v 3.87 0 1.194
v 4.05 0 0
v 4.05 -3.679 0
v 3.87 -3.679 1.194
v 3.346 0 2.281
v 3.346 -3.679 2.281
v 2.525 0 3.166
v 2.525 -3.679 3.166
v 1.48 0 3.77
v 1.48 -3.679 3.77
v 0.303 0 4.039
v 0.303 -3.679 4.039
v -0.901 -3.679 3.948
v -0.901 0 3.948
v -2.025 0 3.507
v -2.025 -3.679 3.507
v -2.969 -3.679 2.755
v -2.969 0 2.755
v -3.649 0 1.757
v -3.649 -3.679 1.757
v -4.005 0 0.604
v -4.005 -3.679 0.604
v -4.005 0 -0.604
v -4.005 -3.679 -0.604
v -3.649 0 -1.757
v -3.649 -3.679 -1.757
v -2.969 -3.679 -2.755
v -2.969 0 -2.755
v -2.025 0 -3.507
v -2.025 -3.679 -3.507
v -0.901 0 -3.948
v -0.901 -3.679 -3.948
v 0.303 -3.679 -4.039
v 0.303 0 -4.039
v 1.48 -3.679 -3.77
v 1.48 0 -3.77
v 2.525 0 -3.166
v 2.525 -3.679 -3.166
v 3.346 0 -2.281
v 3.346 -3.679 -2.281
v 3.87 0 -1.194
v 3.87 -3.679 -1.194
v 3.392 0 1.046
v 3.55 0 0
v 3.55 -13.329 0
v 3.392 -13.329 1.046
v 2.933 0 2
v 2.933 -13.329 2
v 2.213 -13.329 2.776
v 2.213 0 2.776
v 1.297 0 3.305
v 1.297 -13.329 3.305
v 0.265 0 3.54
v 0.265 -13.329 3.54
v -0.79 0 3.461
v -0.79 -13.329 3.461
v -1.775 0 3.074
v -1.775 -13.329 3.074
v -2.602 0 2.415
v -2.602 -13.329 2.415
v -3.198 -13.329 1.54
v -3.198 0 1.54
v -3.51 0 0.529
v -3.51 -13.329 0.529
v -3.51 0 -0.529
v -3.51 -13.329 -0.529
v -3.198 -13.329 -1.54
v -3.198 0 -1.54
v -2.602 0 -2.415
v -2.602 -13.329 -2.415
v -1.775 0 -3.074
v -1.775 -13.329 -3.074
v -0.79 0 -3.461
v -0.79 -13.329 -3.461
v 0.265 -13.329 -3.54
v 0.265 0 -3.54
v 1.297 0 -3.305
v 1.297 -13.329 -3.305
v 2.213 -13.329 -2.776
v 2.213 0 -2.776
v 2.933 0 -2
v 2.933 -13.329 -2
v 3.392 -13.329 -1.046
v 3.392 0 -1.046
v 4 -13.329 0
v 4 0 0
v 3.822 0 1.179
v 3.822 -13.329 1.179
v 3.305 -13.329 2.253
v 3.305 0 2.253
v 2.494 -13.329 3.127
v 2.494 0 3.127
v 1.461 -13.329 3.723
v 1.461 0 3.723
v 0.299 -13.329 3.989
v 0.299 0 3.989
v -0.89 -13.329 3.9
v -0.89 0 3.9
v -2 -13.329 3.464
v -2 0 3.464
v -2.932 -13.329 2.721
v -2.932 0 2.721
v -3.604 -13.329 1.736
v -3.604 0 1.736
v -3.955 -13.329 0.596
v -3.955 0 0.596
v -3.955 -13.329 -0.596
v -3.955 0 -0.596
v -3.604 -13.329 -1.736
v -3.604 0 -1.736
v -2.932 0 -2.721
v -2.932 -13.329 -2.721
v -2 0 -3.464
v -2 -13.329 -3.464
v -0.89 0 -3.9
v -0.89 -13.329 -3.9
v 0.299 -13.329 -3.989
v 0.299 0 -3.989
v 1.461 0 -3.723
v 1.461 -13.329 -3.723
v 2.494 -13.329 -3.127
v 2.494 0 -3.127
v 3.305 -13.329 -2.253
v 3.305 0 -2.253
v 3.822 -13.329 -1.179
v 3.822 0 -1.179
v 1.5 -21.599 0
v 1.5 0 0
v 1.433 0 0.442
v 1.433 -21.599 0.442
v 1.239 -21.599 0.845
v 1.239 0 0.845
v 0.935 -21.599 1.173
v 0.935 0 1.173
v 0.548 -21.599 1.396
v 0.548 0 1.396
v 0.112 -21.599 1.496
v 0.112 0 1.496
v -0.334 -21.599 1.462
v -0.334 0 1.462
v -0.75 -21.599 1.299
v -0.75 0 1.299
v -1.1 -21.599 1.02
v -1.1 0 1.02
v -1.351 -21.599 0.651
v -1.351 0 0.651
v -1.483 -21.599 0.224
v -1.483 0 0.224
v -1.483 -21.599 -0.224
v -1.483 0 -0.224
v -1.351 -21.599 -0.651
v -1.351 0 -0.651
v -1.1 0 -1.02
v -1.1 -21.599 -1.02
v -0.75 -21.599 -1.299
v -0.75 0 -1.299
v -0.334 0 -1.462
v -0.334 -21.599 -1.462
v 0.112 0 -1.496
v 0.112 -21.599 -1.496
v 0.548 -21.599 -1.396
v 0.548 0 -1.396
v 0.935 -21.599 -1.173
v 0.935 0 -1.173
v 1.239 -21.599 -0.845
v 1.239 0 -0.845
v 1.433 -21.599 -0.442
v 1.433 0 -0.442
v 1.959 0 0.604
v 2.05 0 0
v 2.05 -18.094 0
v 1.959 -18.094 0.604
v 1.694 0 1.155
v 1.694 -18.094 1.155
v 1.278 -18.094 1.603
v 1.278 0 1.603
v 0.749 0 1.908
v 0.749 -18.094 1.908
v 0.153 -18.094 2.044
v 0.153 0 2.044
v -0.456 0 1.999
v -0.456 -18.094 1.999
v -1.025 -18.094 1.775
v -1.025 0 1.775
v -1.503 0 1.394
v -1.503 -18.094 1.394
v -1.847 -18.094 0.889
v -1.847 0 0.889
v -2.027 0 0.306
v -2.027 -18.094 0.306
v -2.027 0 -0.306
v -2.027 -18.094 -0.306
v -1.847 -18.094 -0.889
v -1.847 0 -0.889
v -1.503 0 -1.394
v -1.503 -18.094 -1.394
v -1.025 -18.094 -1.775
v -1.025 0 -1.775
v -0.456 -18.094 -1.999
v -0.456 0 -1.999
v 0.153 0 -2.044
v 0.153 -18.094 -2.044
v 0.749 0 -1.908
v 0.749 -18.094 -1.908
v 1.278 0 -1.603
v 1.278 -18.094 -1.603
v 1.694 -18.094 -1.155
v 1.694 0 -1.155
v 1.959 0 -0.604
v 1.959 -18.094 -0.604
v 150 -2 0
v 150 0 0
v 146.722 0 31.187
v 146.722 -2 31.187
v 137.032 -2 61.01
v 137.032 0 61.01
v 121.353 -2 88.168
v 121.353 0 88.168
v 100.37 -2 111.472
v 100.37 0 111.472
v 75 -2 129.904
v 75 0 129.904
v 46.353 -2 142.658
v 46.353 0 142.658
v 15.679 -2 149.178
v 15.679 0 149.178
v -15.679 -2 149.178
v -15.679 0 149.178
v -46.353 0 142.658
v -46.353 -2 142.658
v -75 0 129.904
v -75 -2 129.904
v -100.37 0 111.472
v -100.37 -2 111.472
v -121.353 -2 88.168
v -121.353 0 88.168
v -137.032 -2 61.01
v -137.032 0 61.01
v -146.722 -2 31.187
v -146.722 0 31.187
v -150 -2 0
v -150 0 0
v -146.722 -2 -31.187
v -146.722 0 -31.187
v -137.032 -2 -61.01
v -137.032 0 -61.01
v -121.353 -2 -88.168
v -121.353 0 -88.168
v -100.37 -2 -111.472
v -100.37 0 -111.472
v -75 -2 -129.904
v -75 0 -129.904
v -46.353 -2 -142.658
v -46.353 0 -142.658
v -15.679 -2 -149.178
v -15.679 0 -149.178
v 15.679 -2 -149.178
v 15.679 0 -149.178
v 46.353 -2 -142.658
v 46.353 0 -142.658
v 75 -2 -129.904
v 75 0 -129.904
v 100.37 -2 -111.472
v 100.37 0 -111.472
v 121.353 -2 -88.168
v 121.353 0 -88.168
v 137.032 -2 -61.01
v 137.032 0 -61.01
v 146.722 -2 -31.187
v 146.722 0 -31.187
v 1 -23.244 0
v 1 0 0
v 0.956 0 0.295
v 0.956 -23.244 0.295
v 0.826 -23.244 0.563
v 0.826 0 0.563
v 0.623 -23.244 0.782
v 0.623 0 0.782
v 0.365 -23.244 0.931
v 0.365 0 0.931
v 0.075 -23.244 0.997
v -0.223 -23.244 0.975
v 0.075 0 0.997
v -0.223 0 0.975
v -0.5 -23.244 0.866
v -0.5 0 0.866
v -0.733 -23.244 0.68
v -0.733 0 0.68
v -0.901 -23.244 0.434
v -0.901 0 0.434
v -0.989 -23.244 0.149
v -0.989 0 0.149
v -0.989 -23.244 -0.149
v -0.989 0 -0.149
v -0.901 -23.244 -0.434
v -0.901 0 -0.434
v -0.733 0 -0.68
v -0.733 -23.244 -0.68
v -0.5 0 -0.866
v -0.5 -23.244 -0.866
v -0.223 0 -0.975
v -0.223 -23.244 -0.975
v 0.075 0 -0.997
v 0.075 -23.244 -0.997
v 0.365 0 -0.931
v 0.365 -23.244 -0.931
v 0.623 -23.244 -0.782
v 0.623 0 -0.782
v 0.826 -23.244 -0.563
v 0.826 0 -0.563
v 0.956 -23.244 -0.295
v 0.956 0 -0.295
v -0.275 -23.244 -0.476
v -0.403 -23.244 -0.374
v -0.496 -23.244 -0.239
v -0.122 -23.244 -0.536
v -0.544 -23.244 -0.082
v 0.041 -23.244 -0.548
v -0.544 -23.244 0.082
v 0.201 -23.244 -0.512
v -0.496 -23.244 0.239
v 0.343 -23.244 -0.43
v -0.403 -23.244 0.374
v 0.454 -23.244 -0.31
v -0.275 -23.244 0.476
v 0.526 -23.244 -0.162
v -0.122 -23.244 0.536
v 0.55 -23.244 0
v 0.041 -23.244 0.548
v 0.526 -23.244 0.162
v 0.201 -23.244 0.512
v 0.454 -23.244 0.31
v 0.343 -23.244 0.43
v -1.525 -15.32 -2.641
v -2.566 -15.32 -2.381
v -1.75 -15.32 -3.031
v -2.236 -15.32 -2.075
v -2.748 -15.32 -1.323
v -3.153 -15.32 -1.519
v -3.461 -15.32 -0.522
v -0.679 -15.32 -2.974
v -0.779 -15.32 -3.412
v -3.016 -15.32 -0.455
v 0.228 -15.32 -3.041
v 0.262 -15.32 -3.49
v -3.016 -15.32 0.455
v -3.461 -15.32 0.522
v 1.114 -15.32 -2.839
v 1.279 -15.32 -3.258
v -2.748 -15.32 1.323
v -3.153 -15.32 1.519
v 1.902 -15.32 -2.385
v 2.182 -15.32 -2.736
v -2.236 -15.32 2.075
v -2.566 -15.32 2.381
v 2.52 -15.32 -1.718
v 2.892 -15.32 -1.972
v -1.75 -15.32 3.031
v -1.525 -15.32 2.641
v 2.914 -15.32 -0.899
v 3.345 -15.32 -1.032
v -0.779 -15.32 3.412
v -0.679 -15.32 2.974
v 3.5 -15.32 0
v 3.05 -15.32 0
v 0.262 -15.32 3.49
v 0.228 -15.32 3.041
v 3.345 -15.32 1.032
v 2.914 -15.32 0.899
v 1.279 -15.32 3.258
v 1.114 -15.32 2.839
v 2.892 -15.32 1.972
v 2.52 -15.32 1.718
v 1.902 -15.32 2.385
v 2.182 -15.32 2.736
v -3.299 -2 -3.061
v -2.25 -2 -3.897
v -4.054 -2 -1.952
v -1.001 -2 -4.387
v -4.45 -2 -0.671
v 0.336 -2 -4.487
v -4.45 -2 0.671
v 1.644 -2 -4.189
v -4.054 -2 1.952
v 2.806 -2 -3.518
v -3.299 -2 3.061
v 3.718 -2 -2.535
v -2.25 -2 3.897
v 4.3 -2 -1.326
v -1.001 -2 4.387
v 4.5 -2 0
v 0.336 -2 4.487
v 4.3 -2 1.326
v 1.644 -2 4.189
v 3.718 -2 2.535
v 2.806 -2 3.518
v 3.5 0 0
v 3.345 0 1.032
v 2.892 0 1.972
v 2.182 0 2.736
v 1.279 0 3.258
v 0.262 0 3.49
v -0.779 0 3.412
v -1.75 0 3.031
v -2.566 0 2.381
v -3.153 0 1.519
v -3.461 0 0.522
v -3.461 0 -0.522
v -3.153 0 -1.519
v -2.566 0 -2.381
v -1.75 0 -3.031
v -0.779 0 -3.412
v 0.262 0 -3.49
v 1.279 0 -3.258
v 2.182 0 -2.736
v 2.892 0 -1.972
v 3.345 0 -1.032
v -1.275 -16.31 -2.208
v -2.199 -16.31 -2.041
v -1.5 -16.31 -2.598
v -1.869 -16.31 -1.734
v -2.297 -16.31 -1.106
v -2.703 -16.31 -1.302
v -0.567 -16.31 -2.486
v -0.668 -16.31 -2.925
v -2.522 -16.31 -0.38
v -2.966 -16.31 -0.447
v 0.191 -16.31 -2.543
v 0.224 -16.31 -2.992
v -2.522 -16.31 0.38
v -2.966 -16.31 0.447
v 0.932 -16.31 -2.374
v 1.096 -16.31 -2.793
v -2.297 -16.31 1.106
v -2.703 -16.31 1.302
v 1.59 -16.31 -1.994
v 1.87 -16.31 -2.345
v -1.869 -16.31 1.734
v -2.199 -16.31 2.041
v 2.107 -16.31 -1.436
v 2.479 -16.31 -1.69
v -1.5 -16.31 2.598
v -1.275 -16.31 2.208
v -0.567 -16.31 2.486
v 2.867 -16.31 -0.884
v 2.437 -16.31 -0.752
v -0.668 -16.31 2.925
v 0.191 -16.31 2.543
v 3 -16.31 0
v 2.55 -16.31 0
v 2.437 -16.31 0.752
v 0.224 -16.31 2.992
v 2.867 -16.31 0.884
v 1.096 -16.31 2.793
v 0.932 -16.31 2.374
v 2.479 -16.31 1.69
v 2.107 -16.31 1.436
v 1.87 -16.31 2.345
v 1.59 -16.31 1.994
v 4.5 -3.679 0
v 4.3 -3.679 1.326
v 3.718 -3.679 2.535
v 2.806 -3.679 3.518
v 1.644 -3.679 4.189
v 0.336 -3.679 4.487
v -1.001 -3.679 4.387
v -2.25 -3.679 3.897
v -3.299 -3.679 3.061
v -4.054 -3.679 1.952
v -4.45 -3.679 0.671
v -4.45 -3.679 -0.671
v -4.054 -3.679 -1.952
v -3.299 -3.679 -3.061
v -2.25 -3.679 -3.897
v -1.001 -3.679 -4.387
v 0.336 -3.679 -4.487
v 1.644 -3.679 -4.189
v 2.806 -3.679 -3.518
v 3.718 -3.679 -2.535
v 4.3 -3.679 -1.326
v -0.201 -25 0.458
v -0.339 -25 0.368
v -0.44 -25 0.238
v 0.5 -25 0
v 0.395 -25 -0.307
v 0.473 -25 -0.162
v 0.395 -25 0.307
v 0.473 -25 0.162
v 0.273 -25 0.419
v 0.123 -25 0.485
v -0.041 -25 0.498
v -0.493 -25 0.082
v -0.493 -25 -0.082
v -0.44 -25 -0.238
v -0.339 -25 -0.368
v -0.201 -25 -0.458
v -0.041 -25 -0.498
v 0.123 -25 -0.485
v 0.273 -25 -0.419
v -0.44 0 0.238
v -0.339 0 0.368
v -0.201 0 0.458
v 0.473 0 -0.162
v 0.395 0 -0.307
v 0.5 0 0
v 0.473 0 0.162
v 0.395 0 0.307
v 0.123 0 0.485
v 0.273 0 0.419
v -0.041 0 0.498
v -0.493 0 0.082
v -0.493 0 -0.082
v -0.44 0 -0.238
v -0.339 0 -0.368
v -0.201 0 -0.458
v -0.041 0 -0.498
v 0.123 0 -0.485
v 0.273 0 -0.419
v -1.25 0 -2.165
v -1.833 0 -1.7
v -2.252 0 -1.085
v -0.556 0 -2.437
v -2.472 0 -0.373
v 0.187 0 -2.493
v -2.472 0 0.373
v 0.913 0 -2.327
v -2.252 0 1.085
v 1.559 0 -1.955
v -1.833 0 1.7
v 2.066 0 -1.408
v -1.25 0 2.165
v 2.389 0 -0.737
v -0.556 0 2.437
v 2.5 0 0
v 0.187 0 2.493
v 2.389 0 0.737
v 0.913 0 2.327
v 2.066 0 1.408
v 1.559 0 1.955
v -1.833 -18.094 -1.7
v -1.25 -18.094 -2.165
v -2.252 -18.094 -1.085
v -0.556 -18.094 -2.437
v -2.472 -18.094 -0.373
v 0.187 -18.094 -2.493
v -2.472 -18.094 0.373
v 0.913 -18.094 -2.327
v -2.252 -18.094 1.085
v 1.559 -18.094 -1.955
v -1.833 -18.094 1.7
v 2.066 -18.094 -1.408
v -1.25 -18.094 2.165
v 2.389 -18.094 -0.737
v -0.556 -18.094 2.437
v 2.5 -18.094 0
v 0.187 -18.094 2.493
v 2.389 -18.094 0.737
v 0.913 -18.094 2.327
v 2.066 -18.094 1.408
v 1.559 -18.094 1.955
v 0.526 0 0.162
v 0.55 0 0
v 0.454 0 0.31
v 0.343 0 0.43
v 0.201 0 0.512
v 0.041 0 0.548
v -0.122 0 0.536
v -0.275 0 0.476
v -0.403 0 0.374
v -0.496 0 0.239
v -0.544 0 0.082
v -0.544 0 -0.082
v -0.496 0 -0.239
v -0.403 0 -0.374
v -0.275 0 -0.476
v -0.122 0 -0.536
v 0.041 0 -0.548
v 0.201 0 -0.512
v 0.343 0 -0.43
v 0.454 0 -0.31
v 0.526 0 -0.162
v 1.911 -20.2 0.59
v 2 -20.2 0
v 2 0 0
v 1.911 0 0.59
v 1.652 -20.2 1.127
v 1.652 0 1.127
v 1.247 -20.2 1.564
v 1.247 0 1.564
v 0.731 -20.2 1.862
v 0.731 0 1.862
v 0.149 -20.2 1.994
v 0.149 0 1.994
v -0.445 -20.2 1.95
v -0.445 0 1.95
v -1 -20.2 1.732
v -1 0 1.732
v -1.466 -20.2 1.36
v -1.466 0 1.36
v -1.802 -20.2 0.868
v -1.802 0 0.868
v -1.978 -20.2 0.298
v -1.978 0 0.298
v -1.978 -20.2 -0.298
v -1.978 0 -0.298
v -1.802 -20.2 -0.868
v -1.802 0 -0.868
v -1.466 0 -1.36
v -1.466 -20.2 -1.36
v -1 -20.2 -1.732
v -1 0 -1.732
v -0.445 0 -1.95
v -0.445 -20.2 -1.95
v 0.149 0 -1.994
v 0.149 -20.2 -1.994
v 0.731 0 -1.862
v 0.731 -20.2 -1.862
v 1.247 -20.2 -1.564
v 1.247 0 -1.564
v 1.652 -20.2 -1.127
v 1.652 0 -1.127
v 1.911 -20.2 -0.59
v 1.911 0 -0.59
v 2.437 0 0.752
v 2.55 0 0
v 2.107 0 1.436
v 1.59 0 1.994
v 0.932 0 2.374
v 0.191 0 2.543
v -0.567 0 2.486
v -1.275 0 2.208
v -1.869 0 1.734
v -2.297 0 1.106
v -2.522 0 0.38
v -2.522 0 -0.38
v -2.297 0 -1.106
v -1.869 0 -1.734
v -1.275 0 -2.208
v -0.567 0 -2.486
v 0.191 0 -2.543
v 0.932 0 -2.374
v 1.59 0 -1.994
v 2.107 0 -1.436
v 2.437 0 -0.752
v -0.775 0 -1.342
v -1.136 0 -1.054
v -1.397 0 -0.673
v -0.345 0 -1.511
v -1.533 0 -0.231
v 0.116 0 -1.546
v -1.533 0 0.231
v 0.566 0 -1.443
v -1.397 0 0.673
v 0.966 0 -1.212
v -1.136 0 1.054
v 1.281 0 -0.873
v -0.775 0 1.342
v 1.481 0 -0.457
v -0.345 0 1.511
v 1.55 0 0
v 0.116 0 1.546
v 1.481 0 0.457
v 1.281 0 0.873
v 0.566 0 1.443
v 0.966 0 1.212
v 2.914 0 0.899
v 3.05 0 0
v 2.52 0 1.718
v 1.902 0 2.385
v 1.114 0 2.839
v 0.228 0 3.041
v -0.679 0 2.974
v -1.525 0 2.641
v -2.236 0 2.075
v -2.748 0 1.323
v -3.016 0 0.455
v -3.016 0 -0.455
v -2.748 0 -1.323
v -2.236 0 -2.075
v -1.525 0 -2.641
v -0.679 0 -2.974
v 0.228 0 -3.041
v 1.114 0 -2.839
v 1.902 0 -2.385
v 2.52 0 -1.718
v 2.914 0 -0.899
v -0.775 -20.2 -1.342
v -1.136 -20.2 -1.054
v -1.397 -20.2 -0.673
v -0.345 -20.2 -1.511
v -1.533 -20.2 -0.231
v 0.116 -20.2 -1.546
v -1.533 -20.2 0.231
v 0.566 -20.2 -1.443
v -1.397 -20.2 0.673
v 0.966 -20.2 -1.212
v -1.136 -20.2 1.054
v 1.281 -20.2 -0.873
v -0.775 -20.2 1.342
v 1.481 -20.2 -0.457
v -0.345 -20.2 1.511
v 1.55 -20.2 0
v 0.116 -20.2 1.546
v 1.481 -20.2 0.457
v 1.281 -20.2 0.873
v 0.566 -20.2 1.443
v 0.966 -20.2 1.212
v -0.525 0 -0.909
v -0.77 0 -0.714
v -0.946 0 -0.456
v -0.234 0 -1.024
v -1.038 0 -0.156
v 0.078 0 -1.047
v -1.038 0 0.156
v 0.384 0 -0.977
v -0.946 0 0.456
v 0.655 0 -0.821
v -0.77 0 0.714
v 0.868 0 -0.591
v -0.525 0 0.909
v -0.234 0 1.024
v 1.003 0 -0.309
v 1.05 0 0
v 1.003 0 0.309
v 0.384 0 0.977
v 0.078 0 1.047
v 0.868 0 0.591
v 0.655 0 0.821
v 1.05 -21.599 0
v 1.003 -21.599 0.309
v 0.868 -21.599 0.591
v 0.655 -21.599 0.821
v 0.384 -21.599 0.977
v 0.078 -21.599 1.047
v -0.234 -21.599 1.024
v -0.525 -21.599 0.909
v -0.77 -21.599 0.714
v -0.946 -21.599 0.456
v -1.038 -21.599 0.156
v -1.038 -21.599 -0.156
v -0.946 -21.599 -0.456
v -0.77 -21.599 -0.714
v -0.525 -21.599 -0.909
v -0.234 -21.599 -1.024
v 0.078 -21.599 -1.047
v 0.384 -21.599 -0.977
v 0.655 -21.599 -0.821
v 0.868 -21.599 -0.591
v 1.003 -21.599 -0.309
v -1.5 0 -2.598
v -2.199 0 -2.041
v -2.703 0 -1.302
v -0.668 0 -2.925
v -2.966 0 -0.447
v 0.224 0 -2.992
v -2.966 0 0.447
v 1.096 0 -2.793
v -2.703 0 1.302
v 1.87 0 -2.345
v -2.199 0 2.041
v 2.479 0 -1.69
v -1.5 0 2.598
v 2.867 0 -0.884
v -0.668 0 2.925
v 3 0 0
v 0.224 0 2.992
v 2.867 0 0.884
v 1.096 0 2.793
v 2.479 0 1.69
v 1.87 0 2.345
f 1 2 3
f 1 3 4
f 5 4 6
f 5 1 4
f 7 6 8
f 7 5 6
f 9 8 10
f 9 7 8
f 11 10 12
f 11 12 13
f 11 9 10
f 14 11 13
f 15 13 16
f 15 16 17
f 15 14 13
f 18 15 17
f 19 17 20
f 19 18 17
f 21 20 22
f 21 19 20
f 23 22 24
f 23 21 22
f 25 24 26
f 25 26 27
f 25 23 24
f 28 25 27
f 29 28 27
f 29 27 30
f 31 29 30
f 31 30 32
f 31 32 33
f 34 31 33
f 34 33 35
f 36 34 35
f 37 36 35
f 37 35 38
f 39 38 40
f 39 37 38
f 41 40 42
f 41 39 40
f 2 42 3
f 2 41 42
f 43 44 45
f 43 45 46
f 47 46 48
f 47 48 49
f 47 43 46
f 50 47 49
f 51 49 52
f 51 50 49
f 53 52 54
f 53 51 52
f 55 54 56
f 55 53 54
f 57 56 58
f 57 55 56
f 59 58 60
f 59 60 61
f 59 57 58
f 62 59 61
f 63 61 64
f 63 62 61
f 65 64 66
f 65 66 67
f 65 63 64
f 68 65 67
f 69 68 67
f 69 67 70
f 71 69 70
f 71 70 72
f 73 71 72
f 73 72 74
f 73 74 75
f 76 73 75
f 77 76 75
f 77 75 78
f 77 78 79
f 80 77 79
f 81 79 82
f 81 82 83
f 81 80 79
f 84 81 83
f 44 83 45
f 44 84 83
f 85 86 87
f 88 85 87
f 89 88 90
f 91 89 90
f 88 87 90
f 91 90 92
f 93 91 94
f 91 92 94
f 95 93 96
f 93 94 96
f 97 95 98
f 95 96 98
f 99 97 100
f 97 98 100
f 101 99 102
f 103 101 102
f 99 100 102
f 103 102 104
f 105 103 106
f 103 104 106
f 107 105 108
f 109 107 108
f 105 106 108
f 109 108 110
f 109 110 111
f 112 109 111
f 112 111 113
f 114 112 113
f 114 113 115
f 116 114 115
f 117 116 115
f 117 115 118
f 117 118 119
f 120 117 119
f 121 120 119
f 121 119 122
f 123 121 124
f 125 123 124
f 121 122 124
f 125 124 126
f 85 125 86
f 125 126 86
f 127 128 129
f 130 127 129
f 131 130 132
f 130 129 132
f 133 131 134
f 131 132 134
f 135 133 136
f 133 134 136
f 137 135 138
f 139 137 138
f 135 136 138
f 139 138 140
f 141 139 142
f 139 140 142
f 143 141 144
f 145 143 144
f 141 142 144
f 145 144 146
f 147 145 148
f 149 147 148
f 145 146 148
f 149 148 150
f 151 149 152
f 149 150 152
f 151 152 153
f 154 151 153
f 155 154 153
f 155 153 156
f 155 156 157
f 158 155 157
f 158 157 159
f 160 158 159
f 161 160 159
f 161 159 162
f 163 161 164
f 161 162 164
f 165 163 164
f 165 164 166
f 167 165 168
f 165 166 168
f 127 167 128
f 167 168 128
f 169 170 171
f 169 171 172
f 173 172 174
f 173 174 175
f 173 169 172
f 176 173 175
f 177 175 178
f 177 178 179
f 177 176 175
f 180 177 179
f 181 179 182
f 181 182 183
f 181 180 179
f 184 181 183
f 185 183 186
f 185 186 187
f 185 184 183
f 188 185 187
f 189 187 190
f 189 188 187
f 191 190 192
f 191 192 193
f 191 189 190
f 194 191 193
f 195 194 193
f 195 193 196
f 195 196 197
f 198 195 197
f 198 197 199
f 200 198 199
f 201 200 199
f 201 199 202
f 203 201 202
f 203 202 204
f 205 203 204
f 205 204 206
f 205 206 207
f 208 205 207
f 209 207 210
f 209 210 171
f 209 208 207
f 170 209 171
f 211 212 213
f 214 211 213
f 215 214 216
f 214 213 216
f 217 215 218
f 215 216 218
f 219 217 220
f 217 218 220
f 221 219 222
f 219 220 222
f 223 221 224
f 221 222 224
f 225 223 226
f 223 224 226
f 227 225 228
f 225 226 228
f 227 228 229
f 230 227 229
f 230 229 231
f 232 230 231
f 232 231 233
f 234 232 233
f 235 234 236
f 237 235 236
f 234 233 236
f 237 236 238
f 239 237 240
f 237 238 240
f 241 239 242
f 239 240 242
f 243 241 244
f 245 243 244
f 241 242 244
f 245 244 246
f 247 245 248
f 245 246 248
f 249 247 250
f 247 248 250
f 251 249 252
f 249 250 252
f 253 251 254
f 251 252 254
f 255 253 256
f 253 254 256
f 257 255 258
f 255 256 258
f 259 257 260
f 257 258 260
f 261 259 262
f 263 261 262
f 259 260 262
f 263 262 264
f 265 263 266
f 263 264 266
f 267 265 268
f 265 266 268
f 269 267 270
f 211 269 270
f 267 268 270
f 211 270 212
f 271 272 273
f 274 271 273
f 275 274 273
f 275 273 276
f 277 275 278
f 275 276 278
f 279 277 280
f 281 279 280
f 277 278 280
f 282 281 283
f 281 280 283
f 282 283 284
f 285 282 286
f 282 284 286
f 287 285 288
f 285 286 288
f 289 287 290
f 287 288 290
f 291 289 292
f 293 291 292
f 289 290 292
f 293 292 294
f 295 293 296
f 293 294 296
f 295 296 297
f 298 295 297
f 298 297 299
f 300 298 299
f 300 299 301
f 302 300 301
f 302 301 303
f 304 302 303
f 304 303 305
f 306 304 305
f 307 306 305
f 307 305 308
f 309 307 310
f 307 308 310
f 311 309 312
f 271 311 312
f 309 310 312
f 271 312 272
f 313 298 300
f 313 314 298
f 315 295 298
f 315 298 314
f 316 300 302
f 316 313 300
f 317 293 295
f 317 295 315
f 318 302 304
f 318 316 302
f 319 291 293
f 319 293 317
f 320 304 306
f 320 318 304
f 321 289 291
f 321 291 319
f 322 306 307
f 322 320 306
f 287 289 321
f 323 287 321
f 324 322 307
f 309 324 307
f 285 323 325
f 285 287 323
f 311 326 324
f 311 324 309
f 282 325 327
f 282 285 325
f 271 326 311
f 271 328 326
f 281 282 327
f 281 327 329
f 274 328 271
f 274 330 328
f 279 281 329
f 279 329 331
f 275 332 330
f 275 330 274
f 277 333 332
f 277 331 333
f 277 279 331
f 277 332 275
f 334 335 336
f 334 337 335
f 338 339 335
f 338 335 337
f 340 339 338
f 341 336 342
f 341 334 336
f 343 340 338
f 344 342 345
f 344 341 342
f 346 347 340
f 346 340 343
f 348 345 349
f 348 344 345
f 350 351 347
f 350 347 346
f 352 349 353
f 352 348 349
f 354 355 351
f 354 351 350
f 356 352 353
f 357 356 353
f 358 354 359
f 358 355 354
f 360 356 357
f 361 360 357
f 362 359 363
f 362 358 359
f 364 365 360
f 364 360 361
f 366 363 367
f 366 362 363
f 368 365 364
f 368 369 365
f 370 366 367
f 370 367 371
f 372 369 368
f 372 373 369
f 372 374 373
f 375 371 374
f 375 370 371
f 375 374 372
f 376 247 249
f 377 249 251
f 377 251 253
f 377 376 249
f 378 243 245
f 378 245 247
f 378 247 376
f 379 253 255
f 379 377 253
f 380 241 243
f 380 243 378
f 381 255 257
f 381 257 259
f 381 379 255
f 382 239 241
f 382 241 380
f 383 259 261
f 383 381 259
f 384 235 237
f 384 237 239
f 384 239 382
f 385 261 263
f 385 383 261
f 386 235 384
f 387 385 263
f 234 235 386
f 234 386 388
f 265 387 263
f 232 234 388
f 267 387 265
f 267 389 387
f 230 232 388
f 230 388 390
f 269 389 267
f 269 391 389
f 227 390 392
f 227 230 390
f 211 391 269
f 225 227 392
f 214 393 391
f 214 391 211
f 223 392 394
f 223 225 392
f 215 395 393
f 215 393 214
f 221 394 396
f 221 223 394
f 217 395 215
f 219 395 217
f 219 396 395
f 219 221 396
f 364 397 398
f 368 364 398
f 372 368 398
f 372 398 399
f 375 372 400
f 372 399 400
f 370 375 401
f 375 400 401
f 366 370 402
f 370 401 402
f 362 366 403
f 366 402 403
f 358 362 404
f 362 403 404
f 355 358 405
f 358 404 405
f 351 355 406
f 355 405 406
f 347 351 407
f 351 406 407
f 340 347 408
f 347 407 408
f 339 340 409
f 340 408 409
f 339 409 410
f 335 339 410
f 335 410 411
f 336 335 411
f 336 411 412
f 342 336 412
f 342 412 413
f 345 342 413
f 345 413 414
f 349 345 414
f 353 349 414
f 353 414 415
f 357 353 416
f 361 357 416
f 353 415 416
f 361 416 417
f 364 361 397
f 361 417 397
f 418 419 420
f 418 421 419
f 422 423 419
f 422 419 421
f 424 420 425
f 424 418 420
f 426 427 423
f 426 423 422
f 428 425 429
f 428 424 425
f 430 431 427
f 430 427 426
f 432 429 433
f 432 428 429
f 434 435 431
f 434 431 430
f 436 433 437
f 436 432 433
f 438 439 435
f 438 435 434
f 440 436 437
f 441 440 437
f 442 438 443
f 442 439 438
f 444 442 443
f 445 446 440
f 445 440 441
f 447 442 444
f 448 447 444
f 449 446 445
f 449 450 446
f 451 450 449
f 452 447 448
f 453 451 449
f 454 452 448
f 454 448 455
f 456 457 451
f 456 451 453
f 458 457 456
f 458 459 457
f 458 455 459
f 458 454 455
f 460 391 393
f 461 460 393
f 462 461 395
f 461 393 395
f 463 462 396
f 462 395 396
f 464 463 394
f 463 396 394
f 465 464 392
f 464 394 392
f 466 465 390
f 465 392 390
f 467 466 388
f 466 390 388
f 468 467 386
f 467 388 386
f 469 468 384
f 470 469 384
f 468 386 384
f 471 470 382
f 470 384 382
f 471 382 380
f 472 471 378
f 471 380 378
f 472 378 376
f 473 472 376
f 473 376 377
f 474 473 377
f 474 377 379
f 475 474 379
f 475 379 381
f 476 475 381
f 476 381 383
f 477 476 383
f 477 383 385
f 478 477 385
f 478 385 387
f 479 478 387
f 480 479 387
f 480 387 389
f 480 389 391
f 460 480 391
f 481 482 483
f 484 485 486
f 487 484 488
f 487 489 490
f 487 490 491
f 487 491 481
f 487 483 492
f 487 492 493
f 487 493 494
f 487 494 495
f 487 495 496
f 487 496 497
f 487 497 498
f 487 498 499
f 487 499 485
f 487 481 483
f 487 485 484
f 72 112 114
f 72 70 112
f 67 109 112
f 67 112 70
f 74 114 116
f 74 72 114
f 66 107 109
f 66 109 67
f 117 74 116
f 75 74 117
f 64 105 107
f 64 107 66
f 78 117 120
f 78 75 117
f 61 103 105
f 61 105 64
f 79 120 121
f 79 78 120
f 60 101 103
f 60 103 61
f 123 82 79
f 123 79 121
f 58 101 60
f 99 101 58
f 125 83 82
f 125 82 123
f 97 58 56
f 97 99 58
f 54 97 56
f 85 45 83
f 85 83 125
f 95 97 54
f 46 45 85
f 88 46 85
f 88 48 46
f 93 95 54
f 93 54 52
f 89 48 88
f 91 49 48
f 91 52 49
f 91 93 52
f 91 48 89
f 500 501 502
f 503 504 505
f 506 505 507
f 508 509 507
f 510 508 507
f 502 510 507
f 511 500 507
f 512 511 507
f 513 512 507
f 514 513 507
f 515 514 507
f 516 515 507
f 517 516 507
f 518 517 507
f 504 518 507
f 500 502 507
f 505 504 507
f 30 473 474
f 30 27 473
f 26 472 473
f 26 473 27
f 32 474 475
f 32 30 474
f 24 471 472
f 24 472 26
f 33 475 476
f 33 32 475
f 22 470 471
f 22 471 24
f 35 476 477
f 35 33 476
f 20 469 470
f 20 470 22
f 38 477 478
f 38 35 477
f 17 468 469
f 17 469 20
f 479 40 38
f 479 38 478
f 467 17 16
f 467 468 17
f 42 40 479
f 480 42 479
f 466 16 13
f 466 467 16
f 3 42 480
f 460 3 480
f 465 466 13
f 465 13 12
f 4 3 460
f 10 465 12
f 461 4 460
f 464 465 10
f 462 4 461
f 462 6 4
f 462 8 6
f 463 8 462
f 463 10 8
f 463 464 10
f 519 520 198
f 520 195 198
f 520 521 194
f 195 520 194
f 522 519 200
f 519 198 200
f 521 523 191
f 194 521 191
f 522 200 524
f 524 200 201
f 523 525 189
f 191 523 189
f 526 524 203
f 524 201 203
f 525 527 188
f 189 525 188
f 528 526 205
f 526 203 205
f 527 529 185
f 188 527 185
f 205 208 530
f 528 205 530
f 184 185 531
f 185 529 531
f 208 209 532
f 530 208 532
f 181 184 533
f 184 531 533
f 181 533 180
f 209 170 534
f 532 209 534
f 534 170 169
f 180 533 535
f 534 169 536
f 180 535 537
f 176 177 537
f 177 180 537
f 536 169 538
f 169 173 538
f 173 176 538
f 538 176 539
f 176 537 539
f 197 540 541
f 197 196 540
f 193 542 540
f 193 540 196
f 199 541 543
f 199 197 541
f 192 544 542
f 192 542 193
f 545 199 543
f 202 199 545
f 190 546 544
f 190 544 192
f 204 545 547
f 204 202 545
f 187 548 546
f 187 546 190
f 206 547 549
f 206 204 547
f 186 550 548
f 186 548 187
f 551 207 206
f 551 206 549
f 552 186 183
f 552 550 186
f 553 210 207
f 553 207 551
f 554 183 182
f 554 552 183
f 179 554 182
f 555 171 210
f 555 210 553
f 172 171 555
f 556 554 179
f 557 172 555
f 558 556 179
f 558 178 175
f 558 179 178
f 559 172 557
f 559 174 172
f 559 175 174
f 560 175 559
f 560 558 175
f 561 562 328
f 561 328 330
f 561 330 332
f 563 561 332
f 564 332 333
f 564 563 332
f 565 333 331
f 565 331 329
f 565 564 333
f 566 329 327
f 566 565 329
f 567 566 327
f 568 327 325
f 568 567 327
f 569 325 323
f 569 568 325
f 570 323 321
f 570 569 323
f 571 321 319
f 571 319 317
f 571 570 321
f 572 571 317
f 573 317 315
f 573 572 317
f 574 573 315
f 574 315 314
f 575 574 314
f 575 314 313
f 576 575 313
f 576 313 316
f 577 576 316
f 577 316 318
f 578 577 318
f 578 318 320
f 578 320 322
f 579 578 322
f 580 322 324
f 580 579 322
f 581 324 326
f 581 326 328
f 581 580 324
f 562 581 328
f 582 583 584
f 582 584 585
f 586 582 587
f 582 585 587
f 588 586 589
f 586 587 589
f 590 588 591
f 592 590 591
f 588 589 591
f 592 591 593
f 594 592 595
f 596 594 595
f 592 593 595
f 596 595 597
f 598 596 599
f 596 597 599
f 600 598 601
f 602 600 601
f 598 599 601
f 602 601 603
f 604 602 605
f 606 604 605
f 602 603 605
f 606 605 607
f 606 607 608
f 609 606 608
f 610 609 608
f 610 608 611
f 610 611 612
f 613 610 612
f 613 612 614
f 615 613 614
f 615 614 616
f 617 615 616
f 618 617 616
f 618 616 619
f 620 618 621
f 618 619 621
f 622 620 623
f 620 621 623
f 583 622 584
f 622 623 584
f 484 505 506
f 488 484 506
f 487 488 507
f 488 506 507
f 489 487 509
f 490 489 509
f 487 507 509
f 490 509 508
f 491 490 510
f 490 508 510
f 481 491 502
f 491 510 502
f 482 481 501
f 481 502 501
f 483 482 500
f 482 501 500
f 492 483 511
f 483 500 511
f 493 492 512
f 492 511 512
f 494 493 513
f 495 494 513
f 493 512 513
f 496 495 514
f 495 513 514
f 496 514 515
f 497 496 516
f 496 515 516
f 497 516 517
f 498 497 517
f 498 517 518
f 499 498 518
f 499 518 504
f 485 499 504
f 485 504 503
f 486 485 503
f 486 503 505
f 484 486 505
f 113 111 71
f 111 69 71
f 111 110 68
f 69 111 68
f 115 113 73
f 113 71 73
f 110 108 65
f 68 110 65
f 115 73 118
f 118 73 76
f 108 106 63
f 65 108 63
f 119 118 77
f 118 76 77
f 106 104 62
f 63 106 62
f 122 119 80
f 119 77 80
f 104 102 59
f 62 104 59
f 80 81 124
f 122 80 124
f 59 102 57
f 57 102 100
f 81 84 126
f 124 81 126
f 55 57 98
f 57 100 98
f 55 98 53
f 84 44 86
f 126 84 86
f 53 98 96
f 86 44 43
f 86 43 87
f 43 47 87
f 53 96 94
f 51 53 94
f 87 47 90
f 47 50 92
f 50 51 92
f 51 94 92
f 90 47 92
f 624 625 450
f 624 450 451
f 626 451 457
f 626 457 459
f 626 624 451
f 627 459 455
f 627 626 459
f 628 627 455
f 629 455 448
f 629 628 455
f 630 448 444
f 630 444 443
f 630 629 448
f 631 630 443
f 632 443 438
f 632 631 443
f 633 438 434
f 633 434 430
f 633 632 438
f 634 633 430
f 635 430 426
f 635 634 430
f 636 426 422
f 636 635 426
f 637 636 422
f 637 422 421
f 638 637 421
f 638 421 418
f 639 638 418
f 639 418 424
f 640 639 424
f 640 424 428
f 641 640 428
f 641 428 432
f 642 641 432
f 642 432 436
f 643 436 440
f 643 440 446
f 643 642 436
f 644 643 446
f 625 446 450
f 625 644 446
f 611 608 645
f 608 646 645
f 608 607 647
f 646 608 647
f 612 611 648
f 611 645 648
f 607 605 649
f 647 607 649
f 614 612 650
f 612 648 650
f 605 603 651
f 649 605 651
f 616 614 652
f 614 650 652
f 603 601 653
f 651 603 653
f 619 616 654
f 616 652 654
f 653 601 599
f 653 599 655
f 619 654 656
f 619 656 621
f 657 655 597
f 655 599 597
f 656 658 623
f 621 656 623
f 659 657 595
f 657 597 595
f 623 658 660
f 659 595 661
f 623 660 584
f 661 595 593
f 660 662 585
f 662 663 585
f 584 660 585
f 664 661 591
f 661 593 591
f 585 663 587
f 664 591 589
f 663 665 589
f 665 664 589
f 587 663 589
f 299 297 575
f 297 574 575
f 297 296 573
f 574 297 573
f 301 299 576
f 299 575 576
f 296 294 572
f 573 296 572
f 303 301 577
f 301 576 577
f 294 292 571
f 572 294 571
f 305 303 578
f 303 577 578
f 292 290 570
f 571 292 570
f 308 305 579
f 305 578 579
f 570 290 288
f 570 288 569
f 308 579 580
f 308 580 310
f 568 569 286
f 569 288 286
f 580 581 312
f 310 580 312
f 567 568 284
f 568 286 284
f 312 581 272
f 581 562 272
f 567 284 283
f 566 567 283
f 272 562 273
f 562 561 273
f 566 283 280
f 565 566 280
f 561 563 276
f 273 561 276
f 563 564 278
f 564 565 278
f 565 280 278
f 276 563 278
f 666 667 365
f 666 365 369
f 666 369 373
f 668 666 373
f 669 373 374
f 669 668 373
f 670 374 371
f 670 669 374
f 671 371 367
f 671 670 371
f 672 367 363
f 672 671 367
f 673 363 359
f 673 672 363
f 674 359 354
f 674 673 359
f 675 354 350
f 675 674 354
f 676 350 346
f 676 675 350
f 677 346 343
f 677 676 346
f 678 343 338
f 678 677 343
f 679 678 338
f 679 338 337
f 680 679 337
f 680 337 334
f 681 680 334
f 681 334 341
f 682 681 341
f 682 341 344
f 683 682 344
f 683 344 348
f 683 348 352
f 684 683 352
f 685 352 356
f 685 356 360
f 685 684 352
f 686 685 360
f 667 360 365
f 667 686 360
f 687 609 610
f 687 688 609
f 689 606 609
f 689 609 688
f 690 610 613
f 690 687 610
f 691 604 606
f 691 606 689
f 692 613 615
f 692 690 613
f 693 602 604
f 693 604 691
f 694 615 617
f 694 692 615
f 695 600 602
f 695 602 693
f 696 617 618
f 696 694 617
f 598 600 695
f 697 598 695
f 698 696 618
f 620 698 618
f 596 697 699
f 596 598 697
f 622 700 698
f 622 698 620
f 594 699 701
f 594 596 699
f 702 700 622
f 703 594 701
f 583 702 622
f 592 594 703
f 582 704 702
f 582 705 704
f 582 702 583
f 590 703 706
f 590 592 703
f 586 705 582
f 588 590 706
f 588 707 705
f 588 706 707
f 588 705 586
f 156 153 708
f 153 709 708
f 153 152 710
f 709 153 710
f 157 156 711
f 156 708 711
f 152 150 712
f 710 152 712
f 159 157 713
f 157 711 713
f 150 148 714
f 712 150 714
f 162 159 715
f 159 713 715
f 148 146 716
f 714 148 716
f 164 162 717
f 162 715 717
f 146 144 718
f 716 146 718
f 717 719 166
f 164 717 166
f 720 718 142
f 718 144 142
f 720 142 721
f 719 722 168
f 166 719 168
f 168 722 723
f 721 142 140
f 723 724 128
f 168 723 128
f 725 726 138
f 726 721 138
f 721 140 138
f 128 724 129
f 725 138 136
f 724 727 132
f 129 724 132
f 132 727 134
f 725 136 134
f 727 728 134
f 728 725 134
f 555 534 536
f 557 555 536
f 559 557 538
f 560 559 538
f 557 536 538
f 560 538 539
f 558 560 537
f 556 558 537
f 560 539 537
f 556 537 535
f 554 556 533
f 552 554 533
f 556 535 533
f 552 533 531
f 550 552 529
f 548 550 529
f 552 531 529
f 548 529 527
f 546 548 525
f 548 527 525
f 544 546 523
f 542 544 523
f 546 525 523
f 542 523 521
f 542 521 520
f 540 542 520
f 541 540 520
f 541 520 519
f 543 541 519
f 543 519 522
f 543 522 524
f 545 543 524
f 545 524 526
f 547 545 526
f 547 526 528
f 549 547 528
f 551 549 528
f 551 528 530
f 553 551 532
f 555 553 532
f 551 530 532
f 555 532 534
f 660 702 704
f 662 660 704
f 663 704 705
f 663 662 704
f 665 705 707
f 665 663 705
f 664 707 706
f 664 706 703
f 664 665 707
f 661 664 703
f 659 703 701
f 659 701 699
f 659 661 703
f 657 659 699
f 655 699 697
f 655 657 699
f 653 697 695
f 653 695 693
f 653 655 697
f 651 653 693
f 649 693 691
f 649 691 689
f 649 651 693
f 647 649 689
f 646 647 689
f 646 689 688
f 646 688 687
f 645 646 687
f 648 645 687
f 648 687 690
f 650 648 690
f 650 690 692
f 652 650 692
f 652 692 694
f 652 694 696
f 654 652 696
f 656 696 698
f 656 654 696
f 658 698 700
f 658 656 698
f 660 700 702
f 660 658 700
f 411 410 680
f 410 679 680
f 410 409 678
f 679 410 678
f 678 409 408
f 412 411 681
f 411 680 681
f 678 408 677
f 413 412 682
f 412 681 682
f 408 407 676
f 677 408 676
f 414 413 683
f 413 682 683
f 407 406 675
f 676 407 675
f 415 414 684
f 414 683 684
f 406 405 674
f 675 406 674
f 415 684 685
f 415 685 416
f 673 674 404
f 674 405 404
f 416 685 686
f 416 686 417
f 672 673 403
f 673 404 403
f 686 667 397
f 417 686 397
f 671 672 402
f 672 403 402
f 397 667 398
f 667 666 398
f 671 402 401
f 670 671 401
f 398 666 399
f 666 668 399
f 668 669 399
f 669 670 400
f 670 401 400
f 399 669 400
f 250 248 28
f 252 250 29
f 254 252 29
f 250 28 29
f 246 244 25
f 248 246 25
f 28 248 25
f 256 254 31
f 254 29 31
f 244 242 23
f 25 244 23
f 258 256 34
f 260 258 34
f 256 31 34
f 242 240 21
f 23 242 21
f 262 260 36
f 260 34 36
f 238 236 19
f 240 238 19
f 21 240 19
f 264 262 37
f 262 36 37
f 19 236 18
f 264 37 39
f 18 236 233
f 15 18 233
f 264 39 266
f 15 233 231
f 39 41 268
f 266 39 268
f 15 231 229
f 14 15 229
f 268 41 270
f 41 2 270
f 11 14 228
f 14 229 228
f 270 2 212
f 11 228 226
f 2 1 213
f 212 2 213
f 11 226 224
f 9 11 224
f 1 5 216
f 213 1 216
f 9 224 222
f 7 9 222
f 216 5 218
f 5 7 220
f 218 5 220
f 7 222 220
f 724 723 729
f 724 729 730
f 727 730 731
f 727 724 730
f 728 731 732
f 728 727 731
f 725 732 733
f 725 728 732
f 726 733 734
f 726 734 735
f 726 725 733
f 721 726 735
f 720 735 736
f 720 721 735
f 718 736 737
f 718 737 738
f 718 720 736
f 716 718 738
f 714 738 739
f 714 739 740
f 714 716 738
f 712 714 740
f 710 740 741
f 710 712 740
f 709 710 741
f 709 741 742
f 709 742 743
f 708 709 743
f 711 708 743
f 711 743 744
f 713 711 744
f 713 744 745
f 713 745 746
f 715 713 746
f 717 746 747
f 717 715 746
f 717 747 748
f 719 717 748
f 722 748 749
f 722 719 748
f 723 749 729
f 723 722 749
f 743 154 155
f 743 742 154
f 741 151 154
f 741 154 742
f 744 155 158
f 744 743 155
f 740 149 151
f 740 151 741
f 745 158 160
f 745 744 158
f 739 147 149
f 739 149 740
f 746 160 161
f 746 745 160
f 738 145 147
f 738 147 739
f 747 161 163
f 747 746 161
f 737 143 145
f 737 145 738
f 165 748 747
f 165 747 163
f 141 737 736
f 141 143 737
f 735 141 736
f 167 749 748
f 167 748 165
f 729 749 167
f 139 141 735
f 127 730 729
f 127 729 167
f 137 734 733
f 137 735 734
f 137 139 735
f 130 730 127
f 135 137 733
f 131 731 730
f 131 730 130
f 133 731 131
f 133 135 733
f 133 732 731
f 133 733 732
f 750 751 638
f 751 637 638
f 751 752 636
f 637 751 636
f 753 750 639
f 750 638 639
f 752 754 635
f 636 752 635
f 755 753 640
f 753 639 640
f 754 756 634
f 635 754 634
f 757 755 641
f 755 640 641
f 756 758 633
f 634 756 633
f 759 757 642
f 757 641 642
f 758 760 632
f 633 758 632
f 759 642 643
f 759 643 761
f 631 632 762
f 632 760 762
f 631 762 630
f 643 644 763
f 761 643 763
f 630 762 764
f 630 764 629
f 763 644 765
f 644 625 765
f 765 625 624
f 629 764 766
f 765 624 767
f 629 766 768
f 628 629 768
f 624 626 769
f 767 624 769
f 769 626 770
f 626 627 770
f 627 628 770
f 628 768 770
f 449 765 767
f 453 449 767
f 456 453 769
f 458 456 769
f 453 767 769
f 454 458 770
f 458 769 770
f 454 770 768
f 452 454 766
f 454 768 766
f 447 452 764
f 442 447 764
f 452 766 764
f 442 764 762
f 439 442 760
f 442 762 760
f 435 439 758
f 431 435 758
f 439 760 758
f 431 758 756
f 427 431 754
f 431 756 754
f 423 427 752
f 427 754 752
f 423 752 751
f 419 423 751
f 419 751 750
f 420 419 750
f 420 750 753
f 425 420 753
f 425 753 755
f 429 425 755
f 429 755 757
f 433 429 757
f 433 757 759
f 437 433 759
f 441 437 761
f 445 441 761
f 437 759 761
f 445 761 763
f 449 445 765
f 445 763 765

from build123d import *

# Parameters (mm, degrees)
F0_R      = 0.5
F2_DEPTH  = 25
F0_R_2    = 1
F0_R_3    = 0.55
F3_DEPTH  = 23.24375
F0_R_4    = 1.5
F0_R_5    = 1.05
F4_DEPTH  = 21.59889
F0_R_6    = 2
F0_R_7    = 1.55
F5_DEPTH  = 20.19996
F0_R_8    = 2.5
F0_R_9    = 2.05
F6_DEPTH  = 18.09357
F0_R_10   = 3
F0_R_11   = 2.55
F7_DEPTH  = 16.3101
F0_R_12   = 3.5
F0_R_13   = 3.05
F8_DEPTH  = 15.31986
F0_R_14   = 4
F0_R_15   = 3.55
F9_DEPTH  = 13.32929
F0_R_16   = 4.5
F0_R_17   = 4.05
F10_DEPTH = 3.67881
F1_R      = 150
F1_R_2    = 4.5
F11_DEPTH = 2


with BuildPart() as f2:
    # F0 (on Front) → F2 (new body)
    with BuildSketch(Plane.XZ):
        Circle(F0_R)
    extrude(amount=F2_DEPTH)


with BuildPart() as f3:
    # F0 (on Front) → F3 (new body)
    with BuildSketch(Plane.XZ):
        Circle(F0_R_2)
        Circle(F0_R_3, mode=Mode.SUBTRACT)
    extrude(amount=F3_DEPTH)


with BuildPart() as f4:
    # F0 (on Front) → F4 (new body)
    with BuildSketch(Plane.XZ):
        Circle(F0_R_4)
        Circle(F0_R_5, mode=Mode.SUBTRACT)
    extrude(amount=F4_DEPTH)


with BuildPart() as f5:
    # F0 (on Front) → F5 (new body)
    with BuildSketch(Plane.XZ):
        Circle(F0_R_6)
        Circle(F0_R_7, mode=Mode.SUBTRACT)
    extrude(amount=F5_DEPTH)


with BuildPart() as f6:
    # F0 (on Front) → F6 (new body)
    with BuildSketch(Plane.XZ):
        Circle(F0_R_8)
        Circle(F0_R_9, mode=Mode.SUBTRACT)
    extrude(amount=F6_DEPTH)


with BuildPart() as f7:
    # F0 (on Front) → F7 (new body)
    with BuildSketch(Plane.XZ):
        Circle(F0_R_10)
        Circle(F0_R_11, mode=Mode.SUBTRACT)
    extrude(amount=F7_DEPTH)


with BuildPart() as f8:
    # F0 (on Front) → F8 (new body)
    with BuildSketch(Plane.XZ):
        Circle(F0_R_12)
        Circle(F0_R_13, mode=Mode.SUBTRACT)
    extrude(amount=F8_DEPTH)


with BuildPart() as f9:
    # F0 (on Front) → F9 (new body)
    with BuildSketch(Plane.XZ):
        Circle(F0_R_14)
        Circle(F0_R_15, mode=Mode.SUBTRACT)
    extrude(amount=F9_DEPTH)


with BuildPart() as f10:
    # F0 (on Front) → F10 (new body)
    with BuildSketch(Plane.XZ):
        Circle(F0_R_16)
        Circle(F0_R_17, mode=Mode.SUBTRACT)
    extrude(amount=F10_DEPTH)

    # F1 (on Front) → F11 (join)
    with BuildSketch(Plane.XZ):
        Circle(F1_R)
        Circle(F1_R_2, mode=Mode.SUBTRACT)
    extrude(amount=F11_DEPTH)


solid = Compound([f2.part, f3.part, f4.part, f5.part, f6.part, f7.part, f8.part, f9.part, f10.part])
